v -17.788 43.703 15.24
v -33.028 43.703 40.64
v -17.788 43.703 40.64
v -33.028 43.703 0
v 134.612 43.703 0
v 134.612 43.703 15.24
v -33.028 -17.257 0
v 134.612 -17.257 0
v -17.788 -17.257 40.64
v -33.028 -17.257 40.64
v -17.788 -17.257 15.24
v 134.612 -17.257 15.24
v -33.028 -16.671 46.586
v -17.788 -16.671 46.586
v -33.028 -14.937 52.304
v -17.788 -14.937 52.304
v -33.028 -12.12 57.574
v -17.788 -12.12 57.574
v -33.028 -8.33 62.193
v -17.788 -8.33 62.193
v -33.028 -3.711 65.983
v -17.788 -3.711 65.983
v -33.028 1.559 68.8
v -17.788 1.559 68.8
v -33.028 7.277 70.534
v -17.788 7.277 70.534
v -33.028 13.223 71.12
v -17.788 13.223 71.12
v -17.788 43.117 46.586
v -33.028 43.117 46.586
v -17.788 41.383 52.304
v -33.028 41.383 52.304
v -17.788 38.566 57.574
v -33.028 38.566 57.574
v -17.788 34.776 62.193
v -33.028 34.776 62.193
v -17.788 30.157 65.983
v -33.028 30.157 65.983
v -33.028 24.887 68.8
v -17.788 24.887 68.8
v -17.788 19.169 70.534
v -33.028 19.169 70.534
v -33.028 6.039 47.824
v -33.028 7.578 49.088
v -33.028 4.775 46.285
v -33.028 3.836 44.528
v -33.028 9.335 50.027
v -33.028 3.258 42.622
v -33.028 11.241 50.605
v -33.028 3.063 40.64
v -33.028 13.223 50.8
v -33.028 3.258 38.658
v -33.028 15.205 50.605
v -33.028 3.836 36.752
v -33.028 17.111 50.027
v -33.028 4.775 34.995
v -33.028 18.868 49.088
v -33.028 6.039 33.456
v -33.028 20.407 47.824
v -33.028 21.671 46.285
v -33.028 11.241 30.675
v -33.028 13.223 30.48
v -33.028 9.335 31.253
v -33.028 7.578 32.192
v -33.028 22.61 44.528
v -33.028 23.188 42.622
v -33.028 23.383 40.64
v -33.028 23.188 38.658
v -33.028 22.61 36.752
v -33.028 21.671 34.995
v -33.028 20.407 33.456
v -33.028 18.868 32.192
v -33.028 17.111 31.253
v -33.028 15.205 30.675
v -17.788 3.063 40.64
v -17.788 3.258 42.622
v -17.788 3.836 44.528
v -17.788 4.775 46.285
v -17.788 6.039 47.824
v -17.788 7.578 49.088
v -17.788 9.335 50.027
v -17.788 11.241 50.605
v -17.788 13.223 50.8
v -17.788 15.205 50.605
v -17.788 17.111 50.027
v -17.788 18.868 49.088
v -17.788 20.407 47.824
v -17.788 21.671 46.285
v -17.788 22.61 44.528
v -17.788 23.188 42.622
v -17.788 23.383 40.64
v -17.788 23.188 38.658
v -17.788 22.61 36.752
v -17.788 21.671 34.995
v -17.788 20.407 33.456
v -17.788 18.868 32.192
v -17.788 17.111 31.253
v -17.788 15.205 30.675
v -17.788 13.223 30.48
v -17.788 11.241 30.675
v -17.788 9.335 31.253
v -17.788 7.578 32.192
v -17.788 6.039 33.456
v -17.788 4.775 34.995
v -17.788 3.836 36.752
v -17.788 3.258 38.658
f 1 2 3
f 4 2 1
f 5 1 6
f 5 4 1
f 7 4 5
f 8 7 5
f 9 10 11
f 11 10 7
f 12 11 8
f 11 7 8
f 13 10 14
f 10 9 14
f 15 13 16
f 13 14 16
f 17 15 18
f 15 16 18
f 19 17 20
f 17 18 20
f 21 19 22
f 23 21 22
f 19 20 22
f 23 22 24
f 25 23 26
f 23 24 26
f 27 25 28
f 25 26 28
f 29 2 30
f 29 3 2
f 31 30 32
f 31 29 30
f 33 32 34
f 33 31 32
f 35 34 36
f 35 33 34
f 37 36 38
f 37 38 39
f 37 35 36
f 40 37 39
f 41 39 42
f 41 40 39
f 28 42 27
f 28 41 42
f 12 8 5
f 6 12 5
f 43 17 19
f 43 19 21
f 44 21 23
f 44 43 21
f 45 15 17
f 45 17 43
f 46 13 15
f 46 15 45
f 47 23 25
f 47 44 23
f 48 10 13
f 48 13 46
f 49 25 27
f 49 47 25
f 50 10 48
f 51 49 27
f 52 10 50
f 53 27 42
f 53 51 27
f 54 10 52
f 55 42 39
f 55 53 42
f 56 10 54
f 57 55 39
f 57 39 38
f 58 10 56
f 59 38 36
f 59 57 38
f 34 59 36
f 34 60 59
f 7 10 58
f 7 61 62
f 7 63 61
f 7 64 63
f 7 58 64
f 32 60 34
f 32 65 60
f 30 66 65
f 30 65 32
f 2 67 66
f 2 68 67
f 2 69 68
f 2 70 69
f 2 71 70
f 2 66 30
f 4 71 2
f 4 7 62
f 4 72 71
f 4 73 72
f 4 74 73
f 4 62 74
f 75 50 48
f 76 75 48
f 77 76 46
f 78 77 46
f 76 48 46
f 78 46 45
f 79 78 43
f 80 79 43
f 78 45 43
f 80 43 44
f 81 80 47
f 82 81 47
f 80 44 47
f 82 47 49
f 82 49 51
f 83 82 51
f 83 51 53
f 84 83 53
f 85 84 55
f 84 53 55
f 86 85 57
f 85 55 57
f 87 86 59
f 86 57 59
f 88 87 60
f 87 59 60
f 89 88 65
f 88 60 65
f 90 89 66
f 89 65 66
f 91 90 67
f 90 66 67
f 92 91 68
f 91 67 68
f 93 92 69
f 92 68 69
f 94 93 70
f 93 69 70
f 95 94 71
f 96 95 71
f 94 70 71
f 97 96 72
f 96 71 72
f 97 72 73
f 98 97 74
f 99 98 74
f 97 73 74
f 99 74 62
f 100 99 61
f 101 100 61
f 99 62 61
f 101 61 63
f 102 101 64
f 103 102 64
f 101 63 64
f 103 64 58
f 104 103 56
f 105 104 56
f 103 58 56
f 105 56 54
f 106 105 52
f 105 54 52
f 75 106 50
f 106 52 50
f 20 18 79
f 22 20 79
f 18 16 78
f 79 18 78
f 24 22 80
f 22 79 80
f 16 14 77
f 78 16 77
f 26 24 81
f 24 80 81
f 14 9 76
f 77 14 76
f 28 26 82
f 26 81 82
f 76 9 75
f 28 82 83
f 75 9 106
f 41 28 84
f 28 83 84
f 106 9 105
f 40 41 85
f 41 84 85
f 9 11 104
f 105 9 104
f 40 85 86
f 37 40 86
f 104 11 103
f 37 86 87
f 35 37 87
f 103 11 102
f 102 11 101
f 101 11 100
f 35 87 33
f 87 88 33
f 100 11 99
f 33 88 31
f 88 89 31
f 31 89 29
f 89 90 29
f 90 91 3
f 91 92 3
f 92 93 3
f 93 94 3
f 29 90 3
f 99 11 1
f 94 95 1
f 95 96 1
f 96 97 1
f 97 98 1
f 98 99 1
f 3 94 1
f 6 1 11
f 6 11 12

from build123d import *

# Parameters (mm, degrees)
F0_W     = 167.64
F0_H     = 60.96
F1_DEPTH = 15.24
F2_W     = 15.24
F2_H     = 60.96
F3_DEPTH = 55.88
F4_R     = 30.47999
F5_R     = 10.16
F6_DEPTH = 15.24


# Not quite as in the source:
# - a fillet or chamfer is up to 0.001 mm smaller than in the source, because OpenCascade refuses the exact size


with BuildPart() as f1:
    # F0 (on Top) → F1 (new body)
    with BuildSketch(Plane.XY):
        with Locations((50.7921350074, 13.222941007)):
            Rectangle(F0_W, F0_H)
    extrude(amount=F1_DEPTH)

    # F2 (on face) → F3 (join)
    with BuildSketch(Plane.XY.offset(15.24)):
        with Locations((-25.4078649926, 13.222941007)):
            Rectangle(F2_W, F2_H)
    extrude(amount=F3_DEPTH)

    # F4 (radius 30.48 in the source; OpenCascade refuses exactly that, so slightly less here)
    f4_edges = [f1.edges().sort_by_distance(p)[0] for p in [
        (-25.407865, -17.257059, 71.12),
        (-25.407865, 43.702941, 71.12),
    ]]
    fillet(f4_edges, radius=F4_R)

    # F5 (on face) → F6 (cut)
    with BuildSketch(Plane(origin=(-33.0278649926, 0, 0), x_dir=(0, -1, 0), z_dir=(-1, 0, 0))):
        with Locations((-13.222941007, 40.64)):
            Circle(F5_R)
    extrude(amount=-F6_DEPTH, mode=Mode.SUBTRACT)


solid = f1.part
